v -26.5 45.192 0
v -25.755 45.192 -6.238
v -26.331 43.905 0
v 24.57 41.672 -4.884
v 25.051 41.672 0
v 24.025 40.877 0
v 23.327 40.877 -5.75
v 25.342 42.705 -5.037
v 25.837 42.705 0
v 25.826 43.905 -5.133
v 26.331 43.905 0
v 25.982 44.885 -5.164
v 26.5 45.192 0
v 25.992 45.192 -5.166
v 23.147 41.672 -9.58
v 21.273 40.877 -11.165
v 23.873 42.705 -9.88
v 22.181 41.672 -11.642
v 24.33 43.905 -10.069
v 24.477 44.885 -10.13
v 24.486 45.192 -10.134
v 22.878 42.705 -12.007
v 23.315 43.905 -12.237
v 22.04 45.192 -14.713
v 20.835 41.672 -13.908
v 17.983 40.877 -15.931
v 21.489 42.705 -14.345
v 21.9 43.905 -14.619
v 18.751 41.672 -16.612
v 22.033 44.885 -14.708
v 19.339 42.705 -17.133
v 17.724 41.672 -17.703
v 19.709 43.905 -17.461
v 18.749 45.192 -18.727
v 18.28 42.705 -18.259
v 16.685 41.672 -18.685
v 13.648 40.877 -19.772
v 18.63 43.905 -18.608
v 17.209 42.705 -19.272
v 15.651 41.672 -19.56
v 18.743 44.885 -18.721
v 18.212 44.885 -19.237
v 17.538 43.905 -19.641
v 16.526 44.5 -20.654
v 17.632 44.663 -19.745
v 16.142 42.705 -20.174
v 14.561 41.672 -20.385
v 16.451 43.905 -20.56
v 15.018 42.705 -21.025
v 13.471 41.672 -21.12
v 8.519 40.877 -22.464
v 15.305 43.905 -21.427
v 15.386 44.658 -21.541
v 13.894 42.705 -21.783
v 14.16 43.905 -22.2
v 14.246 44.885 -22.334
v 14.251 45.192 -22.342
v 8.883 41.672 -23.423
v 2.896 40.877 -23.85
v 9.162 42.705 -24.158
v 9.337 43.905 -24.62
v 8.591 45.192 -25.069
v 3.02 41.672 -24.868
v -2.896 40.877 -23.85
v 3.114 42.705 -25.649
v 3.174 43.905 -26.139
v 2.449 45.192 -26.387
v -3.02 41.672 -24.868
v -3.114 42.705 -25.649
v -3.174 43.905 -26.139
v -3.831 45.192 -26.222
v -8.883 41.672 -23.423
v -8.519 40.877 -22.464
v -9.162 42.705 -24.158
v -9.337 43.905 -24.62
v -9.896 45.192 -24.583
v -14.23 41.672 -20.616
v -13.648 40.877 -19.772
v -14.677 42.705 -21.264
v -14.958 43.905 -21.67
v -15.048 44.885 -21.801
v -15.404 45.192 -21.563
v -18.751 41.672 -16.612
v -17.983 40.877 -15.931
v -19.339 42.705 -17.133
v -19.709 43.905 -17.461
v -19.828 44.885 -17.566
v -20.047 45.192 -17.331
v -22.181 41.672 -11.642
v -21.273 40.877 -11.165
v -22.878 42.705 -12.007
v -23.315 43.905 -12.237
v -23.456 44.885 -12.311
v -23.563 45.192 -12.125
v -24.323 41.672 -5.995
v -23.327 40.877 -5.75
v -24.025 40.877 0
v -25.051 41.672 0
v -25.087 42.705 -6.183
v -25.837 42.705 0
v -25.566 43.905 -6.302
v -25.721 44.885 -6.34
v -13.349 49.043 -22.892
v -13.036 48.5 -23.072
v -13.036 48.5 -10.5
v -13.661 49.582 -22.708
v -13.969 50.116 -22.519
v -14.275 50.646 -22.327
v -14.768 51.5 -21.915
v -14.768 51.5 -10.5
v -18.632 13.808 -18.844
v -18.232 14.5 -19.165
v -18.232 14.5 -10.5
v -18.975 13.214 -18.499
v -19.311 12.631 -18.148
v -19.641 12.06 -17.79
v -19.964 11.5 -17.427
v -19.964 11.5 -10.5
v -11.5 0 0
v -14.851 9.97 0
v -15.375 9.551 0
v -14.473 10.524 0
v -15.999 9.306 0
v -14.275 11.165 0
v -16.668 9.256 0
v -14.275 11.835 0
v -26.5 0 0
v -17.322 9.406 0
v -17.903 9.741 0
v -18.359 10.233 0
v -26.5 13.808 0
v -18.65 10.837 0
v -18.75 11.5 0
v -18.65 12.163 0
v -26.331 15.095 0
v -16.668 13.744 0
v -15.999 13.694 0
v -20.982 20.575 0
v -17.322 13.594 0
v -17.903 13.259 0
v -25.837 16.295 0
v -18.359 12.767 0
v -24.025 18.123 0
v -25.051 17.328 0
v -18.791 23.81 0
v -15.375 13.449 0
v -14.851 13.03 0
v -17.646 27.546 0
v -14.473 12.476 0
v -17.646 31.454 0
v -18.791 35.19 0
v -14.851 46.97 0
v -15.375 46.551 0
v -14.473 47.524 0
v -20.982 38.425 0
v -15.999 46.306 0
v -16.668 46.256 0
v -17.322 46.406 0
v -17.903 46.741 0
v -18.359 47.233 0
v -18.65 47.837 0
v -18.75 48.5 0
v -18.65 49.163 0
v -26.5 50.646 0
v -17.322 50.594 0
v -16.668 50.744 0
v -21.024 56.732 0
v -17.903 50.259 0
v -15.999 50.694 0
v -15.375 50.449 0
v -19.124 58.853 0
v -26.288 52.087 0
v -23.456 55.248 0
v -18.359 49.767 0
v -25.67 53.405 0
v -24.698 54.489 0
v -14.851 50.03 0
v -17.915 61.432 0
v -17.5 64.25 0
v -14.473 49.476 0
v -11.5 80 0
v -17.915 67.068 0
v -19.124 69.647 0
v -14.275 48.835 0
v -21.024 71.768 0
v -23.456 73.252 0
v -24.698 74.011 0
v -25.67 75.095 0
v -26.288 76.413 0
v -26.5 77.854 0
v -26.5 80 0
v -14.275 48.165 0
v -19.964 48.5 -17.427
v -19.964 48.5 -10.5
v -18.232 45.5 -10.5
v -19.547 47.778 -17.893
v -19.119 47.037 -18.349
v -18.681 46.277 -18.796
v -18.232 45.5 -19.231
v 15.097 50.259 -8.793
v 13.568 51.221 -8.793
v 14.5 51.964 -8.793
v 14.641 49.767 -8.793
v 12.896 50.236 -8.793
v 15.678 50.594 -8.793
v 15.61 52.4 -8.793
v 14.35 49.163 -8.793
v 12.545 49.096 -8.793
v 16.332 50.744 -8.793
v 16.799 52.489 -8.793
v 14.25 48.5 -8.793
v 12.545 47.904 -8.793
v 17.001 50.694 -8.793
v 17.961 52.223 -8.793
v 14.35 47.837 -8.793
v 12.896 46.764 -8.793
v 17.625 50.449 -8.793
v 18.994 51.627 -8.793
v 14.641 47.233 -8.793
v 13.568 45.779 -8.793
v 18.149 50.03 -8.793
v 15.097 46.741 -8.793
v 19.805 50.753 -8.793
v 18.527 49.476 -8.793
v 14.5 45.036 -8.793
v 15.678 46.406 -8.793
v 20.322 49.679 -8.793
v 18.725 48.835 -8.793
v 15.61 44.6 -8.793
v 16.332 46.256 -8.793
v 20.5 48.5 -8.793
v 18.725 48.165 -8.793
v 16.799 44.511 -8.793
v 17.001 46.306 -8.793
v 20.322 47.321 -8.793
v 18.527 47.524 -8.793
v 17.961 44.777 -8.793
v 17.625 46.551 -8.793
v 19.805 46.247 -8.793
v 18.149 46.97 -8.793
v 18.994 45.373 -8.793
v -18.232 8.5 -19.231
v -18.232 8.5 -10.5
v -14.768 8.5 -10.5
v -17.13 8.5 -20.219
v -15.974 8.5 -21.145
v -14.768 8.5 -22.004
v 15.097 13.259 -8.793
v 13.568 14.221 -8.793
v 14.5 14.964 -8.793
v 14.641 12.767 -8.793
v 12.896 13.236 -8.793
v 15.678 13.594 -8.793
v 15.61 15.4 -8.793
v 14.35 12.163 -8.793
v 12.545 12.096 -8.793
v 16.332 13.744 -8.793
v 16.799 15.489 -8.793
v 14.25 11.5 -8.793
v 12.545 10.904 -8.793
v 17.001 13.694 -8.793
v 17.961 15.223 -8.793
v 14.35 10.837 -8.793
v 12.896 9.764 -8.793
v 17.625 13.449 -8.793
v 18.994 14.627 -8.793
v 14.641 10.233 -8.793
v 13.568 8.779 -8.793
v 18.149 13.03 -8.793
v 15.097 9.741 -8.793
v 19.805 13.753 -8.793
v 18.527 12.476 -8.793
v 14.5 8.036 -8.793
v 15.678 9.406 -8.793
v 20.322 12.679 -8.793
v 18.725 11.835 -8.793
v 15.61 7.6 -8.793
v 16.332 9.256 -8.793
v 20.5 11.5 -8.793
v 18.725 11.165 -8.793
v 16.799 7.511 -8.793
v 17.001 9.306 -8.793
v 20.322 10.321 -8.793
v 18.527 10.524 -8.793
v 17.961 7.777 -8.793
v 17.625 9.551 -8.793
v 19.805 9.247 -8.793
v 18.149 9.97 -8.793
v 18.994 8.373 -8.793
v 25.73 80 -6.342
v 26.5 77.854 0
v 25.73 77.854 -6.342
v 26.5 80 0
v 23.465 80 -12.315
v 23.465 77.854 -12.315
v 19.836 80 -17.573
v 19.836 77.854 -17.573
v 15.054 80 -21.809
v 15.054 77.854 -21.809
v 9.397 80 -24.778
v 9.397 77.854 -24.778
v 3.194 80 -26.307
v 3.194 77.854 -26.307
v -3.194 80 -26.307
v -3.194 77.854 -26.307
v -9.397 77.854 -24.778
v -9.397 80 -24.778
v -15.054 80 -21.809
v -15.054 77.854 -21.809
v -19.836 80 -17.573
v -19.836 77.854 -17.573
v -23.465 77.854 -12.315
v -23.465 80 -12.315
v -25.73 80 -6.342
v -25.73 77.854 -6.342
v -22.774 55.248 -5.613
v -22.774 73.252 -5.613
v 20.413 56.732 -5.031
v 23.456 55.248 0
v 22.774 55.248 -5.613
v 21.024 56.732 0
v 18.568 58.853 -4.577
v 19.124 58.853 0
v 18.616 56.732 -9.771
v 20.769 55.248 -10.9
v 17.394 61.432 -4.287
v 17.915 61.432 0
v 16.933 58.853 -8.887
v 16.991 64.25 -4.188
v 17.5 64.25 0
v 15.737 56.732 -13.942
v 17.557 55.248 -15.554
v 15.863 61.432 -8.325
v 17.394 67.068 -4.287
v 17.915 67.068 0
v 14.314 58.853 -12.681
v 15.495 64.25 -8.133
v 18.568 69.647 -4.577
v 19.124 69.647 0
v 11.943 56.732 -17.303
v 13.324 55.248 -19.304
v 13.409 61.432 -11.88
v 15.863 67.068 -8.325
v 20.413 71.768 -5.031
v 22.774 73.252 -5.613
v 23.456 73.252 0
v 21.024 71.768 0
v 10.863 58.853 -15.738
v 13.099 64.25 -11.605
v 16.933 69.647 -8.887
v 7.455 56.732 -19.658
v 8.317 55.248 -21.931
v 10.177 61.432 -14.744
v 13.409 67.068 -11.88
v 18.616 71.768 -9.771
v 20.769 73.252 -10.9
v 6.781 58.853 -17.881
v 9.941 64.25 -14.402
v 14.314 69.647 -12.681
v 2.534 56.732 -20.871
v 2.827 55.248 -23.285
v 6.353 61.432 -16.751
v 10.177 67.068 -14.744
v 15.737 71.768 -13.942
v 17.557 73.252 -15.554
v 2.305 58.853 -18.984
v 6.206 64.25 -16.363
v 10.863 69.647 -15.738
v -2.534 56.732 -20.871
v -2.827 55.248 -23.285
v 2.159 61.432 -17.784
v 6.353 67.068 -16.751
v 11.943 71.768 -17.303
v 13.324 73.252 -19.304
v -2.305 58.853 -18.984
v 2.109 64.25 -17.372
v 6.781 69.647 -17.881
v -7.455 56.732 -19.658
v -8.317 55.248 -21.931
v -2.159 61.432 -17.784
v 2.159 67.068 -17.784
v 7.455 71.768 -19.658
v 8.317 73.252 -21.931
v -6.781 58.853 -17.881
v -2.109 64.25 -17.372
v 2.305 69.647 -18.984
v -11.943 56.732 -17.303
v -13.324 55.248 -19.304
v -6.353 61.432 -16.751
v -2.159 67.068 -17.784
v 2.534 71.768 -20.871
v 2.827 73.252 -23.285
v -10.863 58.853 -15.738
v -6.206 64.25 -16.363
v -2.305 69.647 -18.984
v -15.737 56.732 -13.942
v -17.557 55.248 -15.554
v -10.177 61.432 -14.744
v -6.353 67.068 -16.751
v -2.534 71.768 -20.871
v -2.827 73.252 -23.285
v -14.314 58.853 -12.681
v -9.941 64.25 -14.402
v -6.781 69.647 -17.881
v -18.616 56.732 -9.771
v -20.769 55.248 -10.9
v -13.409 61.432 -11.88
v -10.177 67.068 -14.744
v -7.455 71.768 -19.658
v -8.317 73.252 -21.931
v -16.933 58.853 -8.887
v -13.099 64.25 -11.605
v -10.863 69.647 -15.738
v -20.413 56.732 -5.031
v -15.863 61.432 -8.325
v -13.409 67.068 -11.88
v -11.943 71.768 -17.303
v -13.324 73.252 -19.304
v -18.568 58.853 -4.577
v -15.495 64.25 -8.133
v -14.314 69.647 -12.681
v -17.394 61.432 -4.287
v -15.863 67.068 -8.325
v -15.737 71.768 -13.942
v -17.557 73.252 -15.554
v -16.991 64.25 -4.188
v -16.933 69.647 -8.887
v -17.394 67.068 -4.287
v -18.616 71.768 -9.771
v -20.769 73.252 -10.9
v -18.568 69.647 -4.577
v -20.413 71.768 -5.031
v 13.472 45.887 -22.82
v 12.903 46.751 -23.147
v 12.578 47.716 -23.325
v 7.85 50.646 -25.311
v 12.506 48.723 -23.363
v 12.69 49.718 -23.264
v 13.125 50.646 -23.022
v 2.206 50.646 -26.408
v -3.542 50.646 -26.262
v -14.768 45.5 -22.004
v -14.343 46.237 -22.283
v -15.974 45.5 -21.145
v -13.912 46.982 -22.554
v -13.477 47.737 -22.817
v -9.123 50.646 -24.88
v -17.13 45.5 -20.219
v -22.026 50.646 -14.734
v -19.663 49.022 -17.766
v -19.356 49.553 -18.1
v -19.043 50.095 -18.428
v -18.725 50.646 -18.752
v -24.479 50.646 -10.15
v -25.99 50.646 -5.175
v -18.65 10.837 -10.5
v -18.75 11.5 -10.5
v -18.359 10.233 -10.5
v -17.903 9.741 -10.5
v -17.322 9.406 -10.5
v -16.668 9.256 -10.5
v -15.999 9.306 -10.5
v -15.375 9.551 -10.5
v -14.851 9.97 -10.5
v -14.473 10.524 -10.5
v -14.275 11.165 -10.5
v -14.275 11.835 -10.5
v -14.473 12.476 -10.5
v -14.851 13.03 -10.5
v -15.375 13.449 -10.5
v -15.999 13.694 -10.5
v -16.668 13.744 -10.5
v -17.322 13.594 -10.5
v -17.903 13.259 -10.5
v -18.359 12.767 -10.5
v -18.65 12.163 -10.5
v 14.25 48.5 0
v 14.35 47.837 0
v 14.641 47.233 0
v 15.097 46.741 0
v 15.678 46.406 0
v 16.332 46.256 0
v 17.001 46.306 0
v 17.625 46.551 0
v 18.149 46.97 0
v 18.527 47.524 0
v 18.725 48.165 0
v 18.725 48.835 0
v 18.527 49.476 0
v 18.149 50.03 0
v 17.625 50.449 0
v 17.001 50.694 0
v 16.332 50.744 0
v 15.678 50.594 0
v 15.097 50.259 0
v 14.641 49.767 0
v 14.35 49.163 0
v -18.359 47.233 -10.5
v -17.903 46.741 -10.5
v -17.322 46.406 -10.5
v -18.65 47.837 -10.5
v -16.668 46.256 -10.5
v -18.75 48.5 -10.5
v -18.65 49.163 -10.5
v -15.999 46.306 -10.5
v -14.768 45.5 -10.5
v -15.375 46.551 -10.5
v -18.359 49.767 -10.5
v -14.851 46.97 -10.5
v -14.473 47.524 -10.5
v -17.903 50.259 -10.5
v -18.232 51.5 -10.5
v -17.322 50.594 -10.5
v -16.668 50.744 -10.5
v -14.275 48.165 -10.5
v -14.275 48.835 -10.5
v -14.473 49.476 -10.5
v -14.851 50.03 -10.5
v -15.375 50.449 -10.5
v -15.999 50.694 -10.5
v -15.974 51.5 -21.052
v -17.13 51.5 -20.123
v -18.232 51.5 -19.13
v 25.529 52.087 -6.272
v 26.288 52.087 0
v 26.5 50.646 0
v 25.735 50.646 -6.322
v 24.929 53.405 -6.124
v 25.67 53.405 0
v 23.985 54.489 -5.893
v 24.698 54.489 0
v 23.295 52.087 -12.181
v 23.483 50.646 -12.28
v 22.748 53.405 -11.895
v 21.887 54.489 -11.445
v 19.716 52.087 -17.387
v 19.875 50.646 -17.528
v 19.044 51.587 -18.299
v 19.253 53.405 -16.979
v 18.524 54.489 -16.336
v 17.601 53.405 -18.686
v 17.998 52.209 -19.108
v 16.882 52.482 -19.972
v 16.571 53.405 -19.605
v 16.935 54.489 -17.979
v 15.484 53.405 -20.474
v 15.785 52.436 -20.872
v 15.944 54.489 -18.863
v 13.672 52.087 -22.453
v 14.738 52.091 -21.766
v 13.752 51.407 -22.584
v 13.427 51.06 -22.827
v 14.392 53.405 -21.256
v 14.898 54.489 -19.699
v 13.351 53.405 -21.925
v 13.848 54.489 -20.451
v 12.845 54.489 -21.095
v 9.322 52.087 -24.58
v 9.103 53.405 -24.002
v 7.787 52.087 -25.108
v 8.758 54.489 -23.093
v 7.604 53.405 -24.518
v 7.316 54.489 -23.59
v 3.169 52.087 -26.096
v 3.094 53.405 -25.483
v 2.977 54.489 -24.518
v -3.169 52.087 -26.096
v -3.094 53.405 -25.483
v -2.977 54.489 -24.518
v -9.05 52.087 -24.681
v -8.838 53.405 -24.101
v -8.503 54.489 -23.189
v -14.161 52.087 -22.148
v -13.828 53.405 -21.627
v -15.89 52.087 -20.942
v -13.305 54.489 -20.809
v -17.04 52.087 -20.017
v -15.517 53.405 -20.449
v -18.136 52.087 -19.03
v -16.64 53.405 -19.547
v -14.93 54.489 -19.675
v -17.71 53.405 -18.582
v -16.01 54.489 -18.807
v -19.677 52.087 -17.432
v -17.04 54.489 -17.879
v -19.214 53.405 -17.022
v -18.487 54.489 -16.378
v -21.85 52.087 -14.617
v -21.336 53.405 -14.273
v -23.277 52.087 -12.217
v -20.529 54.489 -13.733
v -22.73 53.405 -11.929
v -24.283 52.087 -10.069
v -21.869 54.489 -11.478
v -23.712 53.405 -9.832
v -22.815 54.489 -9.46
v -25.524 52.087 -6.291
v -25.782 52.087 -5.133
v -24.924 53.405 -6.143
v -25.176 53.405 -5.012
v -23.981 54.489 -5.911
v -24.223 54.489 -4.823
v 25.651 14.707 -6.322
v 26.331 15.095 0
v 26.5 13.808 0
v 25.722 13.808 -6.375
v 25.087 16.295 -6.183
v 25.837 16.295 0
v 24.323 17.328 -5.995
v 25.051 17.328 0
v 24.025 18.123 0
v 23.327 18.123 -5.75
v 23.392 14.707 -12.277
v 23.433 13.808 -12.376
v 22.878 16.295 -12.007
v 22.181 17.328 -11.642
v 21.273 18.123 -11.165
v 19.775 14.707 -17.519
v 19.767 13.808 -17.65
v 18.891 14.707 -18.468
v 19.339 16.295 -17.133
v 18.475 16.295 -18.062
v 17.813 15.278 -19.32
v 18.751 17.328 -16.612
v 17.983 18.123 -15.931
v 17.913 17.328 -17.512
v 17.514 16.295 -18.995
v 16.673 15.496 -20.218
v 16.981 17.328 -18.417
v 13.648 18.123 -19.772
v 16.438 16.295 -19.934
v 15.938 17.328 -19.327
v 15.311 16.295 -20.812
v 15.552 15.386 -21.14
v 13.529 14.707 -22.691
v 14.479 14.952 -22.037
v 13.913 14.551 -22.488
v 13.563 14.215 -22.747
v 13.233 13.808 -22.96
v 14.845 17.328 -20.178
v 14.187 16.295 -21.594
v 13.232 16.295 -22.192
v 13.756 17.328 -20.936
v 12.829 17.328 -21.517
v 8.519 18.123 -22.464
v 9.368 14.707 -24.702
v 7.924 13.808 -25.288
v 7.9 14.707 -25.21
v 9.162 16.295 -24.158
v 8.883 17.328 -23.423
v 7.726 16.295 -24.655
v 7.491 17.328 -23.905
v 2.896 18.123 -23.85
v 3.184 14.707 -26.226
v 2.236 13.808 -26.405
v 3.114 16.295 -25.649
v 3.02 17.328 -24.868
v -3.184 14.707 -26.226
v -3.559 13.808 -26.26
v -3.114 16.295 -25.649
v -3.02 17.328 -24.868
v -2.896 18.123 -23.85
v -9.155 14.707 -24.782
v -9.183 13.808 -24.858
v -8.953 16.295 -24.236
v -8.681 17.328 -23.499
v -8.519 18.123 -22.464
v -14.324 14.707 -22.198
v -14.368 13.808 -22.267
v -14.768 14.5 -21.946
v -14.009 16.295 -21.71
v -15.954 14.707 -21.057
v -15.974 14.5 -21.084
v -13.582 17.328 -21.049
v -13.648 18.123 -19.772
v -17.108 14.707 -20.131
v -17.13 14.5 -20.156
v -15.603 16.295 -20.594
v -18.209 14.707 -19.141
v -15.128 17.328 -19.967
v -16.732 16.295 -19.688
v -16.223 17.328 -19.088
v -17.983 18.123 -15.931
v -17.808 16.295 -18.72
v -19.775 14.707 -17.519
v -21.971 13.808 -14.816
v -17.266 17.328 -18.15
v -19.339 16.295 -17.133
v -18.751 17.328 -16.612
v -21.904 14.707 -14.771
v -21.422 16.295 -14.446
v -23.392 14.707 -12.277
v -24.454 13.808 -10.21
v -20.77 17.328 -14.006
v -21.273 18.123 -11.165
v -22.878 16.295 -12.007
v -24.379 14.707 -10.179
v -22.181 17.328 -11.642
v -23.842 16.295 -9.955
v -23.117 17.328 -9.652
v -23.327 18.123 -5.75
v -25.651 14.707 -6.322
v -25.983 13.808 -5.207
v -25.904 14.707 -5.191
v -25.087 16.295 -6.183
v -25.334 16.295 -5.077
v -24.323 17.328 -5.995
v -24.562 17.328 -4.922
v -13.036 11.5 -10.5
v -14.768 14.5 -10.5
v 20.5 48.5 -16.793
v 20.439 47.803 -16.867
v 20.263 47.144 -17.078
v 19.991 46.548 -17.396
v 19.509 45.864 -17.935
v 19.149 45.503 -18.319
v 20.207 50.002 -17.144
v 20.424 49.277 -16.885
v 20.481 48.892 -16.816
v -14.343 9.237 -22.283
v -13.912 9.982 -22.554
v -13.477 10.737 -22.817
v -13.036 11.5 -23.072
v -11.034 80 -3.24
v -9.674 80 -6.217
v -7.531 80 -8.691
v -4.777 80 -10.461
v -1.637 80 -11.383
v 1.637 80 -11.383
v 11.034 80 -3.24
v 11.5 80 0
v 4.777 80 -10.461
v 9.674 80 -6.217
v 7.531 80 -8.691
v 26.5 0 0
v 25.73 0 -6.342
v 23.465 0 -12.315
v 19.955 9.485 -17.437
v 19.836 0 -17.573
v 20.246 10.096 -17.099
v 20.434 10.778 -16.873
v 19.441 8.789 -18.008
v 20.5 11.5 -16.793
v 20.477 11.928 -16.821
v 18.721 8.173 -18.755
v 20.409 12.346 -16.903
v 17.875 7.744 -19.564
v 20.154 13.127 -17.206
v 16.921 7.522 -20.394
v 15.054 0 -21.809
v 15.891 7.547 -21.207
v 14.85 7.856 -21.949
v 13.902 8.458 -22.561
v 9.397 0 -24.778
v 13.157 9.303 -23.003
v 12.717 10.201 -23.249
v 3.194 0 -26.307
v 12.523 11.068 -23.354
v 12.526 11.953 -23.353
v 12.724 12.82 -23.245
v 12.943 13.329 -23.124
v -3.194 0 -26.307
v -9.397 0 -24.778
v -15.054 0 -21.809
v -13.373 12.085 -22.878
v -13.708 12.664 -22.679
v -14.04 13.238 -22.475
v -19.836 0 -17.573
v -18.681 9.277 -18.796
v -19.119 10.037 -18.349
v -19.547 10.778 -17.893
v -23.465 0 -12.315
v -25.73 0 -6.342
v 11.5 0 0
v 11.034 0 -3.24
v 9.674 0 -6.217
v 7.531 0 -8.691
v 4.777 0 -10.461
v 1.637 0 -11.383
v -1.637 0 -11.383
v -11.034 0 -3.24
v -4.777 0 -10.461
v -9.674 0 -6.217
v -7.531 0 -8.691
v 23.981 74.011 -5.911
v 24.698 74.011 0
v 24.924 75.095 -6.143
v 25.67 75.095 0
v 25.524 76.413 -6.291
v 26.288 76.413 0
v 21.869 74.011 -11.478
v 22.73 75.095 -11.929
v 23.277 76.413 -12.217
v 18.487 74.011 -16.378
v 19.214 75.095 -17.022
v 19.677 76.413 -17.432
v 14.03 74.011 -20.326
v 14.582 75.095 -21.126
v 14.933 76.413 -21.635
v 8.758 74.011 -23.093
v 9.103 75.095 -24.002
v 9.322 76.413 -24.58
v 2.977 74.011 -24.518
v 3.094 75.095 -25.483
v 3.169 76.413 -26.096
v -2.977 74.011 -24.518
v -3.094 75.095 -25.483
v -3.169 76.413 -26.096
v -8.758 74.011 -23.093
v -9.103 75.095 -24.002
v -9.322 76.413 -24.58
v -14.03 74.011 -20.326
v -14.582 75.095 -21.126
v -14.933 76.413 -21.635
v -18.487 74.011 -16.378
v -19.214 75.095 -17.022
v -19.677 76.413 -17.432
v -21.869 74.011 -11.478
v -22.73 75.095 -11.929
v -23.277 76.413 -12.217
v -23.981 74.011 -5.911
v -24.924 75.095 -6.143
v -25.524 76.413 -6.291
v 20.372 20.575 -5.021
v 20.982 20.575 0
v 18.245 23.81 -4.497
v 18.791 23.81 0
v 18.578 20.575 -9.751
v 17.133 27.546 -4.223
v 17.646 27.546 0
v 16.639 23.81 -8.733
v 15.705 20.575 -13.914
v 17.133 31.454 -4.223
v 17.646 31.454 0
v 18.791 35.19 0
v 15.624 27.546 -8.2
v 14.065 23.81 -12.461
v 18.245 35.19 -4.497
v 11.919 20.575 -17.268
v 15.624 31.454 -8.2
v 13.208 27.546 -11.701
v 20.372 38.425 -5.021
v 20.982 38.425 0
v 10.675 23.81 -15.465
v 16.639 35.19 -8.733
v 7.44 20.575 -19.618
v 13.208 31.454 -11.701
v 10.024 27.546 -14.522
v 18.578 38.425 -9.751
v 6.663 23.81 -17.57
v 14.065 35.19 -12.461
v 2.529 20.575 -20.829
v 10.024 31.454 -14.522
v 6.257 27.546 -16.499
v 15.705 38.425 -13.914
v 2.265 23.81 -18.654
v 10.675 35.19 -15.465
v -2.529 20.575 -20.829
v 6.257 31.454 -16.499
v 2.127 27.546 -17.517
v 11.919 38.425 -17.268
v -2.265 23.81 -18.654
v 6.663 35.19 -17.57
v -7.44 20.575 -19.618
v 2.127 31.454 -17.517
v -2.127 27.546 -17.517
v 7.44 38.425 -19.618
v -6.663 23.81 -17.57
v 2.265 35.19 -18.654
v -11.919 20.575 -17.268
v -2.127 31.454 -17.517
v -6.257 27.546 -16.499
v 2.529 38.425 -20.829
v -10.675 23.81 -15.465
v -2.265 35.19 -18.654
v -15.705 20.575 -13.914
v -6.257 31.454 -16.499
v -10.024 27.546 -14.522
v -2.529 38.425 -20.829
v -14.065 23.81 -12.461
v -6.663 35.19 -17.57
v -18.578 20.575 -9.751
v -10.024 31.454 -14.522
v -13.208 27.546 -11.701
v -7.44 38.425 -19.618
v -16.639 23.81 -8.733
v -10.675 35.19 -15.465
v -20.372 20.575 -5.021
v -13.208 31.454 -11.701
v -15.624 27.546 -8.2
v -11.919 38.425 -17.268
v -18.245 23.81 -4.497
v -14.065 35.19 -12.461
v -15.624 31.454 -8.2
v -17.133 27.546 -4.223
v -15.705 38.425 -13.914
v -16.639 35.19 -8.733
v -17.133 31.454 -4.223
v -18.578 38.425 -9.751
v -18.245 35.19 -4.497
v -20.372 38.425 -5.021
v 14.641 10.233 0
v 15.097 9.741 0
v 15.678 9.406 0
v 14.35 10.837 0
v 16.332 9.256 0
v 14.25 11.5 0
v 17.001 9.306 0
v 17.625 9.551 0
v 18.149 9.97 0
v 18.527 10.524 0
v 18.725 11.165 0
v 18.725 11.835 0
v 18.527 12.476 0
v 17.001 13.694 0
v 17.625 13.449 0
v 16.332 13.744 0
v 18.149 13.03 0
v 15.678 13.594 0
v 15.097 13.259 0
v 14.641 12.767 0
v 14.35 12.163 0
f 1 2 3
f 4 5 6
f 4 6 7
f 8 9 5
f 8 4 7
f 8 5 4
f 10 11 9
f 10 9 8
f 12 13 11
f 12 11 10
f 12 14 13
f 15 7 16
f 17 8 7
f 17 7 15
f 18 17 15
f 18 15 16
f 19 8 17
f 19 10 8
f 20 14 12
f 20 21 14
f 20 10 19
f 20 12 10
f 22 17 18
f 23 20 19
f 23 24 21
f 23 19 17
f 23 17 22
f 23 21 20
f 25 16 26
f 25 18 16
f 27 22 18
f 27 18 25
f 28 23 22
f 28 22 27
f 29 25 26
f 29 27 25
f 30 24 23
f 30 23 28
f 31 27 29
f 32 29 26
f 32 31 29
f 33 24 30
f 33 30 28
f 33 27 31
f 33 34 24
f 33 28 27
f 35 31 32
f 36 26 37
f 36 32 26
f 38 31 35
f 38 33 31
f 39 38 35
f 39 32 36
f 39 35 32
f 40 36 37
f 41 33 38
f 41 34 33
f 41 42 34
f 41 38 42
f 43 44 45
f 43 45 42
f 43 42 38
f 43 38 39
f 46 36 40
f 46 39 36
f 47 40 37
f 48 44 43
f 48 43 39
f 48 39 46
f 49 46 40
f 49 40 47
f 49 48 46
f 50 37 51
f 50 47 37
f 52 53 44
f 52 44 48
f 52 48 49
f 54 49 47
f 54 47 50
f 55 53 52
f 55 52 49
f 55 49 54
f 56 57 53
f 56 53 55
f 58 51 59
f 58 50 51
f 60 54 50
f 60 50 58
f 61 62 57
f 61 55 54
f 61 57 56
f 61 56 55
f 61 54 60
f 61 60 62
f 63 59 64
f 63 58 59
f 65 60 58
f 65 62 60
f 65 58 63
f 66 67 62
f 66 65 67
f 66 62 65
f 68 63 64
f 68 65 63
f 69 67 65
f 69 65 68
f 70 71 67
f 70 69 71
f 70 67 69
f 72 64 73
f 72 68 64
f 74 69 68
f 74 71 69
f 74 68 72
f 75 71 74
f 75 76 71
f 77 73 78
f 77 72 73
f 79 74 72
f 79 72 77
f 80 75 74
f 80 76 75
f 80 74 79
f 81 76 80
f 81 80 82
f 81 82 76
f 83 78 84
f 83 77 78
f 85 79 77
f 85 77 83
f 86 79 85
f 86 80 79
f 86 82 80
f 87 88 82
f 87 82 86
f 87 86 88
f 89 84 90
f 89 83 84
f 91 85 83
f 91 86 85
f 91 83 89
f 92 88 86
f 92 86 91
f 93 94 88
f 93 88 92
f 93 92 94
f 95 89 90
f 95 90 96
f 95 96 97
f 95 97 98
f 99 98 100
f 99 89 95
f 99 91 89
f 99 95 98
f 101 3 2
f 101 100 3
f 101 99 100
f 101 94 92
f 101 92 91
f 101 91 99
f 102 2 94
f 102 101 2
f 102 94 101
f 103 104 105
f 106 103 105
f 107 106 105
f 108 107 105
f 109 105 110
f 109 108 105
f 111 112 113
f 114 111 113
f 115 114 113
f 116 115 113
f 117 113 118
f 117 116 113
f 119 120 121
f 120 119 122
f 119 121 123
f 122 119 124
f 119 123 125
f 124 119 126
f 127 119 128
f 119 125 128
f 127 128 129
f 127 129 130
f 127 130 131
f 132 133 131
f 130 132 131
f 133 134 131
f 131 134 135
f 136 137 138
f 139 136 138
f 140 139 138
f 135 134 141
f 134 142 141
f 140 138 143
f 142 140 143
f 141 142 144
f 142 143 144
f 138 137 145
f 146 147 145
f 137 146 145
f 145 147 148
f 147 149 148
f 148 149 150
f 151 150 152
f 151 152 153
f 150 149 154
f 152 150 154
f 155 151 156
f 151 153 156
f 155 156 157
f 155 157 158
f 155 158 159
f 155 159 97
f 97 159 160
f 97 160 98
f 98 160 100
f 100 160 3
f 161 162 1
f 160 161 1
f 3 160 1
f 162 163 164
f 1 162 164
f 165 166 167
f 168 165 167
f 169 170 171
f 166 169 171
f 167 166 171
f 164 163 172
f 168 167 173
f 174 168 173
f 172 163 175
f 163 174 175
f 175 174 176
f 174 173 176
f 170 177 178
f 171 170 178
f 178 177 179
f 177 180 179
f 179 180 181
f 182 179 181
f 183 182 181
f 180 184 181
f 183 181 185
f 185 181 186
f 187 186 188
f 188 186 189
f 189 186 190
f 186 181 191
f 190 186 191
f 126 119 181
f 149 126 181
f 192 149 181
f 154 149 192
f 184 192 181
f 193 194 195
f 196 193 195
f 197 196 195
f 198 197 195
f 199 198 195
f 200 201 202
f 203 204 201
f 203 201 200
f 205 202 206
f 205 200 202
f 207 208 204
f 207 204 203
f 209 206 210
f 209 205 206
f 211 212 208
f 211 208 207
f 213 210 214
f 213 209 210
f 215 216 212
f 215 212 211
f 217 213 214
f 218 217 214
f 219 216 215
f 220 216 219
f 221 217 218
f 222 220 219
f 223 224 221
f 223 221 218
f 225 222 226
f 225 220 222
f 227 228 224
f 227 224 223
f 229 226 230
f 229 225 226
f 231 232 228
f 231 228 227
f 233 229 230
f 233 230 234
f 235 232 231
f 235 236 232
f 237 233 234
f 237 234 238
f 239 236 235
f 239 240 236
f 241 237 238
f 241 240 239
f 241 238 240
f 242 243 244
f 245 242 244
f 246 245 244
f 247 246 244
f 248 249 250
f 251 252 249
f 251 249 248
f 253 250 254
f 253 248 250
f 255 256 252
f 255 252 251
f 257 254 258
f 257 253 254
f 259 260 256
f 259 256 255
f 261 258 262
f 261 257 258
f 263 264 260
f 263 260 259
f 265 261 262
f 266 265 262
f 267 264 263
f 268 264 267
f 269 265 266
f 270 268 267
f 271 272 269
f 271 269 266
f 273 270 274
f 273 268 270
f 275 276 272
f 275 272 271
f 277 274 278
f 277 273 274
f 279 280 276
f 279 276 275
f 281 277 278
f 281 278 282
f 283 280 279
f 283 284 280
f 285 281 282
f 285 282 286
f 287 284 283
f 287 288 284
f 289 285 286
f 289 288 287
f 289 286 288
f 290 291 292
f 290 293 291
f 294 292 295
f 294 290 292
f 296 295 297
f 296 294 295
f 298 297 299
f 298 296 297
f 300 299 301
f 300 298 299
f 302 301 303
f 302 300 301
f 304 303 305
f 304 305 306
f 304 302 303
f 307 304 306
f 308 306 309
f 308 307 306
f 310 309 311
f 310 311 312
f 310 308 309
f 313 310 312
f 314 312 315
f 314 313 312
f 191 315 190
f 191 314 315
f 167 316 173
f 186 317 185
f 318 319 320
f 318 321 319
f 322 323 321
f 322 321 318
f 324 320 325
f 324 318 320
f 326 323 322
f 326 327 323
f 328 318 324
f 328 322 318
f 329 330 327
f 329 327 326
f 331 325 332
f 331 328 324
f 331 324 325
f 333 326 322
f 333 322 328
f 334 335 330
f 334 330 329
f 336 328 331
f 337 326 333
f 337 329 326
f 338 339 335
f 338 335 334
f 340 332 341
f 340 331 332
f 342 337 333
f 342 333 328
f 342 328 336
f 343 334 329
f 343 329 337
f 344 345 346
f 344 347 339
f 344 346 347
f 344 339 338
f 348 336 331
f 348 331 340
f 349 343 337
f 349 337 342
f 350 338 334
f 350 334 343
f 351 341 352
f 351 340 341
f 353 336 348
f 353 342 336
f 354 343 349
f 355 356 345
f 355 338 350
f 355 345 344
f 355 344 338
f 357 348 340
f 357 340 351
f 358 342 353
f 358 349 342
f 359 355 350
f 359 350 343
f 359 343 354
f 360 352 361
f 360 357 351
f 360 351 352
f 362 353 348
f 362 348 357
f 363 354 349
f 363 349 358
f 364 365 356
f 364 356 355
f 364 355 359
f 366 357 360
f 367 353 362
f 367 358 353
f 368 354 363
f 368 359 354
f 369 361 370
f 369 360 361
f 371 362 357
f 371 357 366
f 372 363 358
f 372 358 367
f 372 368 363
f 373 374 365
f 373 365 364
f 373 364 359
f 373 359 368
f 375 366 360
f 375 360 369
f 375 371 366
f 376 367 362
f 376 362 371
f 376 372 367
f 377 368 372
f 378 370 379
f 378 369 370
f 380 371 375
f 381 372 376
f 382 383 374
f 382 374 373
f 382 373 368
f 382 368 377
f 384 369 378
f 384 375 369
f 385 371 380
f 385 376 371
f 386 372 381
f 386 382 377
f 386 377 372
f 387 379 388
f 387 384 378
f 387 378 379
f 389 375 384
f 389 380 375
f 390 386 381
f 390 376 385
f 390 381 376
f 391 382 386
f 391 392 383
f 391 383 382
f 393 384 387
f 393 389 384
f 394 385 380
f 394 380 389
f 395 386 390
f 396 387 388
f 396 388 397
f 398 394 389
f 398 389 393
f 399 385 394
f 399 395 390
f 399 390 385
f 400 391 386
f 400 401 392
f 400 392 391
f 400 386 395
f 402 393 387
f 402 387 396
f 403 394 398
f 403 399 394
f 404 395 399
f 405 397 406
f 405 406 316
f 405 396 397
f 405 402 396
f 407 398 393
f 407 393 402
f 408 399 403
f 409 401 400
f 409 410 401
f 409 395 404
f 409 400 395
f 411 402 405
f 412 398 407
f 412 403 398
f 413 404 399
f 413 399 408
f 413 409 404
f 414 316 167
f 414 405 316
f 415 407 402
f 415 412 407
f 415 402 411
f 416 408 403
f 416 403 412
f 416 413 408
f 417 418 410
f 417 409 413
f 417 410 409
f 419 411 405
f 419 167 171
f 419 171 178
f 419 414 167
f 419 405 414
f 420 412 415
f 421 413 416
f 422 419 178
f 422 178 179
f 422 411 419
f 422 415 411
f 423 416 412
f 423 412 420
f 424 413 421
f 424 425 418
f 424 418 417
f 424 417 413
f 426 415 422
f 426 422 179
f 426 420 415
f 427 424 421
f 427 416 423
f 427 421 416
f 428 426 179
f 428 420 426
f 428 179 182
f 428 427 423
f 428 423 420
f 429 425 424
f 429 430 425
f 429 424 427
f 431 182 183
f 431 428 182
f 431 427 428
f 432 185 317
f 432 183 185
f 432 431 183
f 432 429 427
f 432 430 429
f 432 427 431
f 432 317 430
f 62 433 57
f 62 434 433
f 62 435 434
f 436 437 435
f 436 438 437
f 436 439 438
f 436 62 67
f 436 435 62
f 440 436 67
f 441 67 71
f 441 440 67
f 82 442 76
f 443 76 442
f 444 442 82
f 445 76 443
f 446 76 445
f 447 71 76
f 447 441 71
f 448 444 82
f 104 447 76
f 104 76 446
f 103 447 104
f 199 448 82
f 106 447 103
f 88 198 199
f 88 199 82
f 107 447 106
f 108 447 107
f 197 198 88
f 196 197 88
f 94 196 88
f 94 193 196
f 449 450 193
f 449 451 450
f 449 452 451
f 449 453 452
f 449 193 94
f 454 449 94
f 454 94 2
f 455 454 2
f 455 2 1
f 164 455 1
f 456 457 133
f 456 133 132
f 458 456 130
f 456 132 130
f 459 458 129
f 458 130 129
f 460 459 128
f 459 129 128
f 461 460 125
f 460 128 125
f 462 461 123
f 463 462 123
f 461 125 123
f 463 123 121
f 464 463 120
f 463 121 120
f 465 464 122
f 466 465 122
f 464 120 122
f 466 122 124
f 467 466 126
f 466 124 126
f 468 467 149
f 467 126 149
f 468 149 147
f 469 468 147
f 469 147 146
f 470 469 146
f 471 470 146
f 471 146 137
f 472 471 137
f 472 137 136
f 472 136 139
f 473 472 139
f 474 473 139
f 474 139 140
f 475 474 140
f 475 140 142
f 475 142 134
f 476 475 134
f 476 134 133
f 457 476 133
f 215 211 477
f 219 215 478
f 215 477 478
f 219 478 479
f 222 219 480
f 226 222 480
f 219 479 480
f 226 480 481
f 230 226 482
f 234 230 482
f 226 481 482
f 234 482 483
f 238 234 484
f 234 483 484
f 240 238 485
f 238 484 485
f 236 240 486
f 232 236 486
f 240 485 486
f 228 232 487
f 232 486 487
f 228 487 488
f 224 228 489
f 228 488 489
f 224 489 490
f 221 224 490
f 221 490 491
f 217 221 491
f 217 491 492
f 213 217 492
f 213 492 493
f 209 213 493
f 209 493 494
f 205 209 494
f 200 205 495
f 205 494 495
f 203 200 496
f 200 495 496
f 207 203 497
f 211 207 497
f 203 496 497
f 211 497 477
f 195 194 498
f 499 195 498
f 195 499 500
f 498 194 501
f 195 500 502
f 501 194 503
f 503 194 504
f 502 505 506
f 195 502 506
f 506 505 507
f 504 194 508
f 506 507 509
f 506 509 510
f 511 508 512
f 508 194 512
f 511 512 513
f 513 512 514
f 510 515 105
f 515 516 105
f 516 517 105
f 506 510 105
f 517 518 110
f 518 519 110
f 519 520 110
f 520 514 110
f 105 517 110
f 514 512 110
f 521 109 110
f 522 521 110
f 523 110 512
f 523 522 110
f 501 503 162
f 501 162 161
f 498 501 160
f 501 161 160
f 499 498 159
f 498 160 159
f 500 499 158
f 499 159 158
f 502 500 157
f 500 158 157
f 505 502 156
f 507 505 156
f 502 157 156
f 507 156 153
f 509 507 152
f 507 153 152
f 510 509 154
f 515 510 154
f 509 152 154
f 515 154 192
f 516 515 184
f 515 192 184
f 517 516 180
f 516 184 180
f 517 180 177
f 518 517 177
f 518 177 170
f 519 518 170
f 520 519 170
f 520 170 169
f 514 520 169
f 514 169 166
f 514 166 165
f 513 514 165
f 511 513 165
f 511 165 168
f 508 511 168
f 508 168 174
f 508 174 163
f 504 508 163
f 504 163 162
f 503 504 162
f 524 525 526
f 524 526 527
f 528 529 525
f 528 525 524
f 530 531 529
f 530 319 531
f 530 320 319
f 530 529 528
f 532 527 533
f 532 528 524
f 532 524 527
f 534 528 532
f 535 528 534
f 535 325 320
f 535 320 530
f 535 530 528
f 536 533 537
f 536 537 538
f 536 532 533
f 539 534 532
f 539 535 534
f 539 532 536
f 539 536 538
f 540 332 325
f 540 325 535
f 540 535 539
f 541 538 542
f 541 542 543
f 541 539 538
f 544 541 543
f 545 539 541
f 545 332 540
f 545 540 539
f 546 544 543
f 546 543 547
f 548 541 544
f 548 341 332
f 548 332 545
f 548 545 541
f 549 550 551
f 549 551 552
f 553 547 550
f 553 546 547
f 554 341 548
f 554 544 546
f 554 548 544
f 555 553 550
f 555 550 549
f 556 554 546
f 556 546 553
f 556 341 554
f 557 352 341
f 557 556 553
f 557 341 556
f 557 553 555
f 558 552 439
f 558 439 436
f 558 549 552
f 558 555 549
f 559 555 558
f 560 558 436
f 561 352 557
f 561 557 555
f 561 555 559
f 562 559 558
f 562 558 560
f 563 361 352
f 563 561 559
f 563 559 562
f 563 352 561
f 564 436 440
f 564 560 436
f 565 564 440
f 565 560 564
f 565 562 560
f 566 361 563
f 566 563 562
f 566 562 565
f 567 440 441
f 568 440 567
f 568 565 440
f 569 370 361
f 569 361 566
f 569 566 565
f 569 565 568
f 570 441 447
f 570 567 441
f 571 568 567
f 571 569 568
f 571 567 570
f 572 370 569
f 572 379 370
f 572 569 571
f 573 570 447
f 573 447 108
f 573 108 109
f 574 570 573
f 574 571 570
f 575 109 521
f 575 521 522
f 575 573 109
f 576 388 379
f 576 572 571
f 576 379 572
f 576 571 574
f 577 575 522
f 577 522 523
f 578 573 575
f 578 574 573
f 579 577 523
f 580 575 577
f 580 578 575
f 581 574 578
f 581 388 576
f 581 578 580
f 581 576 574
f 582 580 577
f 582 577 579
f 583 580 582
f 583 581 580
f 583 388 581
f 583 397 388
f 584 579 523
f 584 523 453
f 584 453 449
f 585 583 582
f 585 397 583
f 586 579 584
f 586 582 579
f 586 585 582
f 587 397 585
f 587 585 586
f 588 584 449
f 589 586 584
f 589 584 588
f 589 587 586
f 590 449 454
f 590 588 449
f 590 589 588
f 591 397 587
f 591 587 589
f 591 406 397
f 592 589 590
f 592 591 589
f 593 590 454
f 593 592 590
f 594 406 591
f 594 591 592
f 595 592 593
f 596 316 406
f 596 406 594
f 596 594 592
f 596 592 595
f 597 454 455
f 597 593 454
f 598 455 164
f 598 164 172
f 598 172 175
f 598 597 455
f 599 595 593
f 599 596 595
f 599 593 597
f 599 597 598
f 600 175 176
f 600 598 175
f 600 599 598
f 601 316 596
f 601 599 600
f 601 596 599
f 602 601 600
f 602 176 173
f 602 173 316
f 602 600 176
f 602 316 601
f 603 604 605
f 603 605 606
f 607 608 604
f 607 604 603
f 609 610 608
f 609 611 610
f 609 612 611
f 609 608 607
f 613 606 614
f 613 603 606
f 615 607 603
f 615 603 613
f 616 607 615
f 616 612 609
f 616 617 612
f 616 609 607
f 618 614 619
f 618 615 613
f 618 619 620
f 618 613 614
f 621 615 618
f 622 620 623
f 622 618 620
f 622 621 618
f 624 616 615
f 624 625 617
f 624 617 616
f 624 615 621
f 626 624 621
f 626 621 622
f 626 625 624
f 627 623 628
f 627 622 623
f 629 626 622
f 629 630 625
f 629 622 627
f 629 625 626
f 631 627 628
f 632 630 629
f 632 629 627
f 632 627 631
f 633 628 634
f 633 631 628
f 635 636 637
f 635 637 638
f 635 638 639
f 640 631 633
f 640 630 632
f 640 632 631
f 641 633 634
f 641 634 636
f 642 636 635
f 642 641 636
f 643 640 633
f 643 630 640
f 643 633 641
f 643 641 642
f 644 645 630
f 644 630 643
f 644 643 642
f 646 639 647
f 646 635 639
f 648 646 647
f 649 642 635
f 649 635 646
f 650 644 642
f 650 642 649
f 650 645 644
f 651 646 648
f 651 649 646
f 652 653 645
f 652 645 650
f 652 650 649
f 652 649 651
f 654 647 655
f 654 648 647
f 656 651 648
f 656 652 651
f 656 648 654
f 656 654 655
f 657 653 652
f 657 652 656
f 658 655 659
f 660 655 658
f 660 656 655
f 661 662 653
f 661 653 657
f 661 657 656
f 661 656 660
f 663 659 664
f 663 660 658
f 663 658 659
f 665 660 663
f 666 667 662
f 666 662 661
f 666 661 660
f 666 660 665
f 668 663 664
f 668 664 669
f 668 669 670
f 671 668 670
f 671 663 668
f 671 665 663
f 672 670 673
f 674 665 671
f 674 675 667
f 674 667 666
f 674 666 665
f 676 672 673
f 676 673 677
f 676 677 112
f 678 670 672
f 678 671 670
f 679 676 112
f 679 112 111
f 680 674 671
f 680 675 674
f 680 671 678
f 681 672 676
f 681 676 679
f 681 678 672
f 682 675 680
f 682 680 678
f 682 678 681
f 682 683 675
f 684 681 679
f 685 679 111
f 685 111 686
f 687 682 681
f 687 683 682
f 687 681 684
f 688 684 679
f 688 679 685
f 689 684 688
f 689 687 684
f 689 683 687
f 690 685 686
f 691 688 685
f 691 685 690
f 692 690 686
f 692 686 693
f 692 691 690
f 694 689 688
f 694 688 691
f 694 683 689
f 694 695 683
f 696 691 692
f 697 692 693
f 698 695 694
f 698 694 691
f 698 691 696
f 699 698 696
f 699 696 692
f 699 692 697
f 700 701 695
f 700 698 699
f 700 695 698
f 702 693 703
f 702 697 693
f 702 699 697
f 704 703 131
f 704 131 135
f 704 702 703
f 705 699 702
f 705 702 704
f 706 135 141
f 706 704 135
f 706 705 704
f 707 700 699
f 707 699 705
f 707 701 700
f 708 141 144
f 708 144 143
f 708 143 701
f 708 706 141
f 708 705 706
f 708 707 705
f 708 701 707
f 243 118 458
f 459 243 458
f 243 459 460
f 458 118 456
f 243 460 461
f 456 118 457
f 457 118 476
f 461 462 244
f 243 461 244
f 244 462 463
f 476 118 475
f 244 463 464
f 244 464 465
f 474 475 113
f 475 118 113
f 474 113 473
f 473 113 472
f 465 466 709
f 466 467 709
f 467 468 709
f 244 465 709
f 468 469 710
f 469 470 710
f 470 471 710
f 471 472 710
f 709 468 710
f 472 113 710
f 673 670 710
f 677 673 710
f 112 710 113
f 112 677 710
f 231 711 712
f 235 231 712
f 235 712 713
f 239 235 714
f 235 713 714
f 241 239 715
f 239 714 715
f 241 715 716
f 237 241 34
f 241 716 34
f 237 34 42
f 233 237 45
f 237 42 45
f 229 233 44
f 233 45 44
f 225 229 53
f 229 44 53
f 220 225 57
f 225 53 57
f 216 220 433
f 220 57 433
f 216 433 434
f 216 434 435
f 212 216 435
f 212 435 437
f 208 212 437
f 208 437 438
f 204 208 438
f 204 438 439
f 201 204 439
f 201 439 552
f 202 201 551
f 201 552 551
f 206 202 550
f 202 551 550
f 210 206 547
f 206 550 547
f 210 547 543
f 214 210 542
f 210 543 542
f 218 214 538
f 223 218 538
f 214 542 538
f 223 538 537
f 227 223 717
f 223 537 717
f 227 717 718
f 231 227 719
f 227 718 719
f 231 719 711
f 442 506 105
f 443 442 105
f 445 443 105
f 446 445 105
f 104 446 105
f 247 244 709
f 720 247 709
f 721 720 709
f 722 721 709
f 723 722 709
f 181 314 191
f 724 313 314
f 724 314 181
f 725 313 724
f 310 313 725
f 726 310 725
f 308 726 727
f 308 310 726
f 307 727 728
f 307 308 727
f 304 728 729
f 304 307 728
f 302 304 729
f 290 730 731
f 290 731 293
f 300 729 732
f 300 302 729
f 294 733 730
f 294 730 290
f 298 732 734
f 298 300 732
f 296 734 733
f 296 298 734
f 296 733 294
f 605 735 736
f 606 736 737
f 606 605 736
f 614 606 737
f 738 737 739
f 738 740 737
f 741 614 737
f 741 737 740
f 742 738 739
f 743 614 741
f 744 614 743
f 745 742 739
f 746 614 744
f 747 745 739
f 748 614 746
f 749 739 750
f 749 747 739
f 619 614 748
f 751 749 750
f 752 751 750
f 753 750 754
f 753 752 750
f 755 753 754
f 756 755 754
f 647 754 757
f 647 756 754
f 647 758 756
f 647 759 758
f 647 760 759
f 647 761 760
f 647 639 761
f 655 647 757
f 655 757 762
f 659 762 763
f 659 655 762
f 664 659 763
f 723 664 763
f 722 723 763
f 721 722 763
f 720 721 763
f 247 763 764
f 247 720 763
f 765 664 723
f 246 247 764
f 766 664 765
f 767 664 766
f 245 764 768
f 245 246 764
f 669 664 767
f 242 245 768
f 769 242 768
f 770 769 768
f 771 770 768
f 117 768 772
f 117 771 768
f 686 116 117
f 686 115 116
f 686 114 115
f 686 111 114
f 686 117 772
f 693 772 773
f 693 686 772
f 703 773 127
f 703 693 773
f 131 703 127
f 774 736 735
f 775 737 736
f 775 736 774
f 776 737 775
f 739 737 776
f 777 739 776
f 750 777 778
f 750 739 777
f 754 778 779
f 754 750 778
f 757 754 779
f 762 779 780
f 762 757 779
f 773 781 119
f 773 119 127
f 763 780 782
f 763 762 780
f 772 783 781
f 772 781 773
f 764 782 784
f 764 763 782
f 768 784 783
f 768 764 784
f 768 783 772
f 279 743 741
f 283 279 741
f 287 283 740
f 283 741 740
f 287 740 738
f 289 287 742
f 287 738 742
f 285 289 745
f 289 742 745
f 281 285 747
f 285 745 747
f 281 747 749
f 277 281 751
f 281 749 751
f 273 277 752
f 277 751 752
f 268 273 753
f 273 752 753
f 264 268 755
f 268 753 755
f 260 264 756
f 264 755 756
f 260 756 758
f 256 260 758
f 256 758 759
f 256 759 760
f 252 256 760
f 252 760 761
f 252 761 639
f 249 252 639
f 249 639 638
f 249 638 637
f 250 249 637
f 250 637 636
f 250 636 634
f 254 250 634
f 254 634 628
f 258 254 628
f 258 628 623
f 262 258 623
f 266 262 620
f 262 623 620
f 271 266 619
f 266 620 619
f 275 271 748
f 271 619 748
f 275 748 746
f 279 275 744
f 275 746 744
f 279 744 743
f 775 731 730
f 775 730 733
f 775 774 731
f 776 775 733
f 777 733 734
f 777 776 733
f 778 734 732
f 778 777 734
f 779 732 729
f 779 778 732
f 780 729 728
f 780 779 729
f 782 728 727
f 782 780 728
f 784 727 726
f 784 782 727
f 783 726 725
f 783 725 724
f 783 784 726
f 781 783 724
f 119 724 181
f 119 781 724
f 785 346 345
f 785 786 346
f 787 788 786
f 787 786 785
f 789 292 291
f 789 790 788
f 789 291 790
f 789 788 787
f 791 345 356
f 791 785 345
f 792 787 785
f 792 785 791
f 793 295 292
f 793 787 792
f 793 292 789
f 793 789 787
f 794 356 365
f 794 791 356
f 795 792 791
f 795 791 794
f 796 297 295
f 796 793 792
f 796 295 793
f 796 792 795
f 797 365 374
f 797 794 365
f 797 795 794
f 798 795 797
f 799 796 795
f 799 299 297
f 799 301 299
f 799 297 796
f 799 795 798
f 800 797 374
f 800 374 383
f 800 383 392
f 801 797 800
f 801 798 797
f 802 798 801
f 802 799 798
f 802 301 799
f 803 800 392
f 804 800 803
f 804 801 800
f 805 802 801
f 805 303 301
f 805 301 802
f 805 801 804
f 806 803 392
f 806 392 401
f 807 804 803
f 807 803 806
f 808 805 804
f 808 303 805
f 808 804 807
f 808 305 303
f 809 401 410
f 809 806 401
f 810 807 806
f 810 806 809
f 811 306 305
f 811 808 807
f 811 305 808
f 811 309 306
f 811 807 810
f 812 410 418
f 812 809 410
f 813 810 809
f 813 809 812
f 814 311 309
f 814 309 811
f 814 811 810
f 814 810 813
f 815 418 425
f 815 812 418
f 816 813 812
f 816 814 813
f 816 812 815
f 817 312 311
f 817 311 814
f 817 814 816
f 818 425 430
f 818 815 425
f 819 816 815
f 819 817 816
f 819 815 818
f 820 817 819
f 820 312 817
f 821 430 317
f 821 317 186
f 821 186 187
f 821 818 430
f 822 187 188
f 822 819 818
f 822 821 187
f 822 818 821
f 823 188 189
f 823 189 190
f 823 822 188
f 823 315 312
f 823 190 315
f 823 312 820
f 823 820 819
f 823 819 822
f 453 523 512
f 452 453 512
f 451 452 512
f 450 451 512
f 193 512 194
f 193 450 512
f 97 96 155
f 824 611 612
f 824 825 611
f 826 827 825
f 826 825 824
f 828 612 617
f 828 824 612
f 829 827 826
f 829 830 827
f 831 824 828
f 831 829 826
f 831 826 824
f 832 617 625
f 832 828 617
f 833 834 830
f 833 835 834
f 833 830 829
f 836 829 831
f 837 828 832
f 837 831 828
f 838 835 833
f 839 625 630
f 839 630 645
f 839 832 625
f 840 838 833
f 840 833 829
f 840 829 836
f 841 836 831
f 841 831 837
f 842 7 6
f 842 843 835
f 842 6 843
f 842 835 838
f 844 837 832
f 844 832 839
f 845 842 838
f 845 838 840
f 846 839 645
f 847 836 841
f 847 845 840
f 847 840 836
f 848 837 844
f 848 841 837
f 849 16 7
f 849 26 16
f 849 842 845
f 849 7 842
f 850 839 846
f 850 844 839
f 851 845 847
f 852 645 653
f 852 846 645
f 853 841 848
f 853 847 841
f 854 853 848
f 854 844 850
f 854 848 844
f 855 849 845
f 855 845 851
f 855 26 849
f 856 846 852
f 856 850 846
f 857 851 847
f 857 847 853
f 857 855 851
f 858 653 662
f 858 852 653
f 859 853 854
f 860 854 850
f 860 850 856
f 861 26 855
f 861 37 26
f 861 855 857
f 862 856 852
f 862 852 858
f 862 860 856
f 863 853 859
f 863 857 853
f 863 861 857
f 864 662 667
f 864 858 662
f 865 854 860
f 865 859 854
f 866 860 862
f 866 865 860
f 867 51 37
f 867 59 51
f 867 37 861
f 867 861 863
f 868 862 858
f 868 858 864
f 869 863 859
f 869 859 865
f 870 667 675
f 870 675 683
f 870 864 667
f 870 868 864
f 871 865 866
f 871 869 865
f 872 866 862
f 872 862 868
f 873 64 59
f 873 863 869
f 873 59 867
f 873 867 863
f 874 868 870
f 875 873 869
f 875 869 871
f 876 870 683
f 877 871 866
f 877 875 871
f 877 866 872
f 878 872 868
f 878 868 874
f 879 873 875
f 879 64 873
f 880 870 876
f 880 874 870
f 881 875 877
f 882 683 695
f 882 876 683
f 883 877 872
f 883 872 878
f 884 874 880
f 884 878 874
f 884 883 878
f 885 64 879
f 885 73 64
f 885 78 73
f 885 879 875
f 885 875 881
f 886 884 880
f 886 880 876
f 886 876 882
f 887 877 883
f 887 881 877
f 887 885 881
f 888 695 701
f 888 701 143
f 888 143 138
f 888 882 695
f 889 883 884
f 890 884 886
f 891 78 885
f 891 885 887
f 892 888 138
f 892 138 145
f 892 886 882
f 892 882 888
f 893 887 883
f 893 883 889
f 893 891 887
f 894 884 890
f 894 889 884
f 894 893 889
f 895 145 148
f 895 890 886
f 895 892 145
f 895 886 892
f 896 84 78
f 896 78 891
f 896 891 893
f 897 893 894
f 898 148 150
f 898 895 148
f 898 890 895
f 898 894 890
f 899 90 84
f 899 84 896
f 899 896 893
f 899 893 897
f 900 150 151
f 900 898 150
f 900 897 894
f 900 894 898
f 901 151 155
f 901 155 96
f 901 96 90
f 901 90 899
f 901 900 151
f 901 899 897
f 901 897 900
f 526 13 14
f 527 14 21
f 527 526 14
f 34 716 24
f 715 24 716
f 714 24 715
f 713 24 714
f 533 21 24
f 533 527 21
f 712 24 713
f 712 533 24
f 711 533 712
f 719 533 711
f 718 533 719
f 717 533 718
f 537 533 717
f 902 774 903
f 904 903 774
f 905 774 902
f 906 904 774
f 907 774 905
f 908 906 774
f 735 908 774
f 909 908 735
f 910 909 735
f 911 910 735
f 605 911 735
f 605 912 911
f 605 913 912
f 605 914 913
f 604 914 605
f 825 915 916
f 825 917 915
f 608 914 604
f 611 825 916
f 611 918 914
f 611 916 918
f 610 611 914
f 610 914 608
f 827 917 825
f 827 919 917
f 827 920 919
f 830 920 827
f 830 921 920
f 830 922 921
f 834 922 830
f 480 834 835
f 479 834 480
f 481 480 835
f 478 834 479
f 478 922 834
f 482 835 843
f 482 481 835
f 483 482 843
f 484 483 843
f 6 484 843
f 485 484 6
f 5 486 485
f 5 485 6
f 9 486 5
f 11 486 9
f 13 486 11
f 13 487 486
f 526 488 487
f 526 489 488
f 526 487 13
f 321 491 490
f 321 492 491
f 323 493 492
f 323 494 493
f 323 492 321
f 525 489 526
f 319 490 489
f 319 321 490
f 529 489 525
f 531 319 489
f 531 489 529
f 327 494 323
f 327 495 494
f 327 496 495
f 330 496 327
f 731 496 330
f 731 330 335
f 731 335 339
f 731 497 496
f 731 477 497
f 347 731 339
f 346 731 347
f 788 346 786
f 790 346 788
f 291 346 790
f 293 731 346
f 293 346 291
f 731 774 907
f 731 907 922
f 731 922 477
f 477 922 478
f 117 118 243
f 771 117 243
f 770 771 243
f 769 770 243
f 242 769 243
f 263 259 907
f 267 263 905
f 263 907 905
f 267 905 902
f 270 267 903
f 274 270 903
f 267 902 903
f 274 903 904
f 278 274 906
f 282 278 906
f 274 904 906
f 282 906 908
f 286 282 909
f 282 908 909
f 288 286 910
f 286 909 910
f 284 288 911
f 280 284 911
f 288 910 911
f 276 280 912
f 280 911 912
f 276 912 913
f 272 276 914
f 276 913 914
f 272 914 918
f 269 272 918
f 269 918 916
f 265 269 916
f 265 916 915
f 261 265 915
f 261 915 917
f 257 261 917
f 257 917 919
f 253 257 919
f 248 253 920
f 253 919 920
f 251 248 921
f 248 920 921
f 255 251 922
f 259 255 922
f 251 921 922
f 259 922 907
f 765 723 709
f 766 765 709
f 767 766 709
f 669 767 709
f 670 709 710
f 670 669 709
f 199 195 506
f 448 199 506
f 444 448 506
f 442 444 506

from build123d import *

# Parameters (mm, degrees)
F1_ANGLE       = 180
F4_D           = 4.5
F4_START       = 9.7071445
F4_CBORE_D     = 8
F4_CBORE_DEPTH = 8
F5_D           = 4.5
F6_DEPTH       = 16
F7_DEPTH       = 16


with BuildPart() as f1:
    # F0 (on Top) → F1 (revolve)
    with BuildSketch(Plane.XY):
        with BuildLine():
            Line((11.5, 80), (11.5, 0))
            Line((11.5, 0), (26.5, 0))
            Line((26.5, 0), (26.5, 13.8076451735))
            ThreePointArc((26.5, 13.8076451735), (25.8372883559, 16.2952001412), (24.0248281131, 18.123342452))
            ThreePointArc((24.0248281131, 18.123342452), (17.5, 29.5), (24.0248281131, 40.876657548))
            ThreePointArc((24.0248281131, 40.876657548), (25.8372883559, 42.7047998588), (26.5, 45.1923548265))
            Line((26.5, 45.1923548265), (26.5, 50.6462321396))
            ThreePointArc((26.5, 50.6462321396), (25.6700127509, 53.4050350788), (23.455602537, 55.2479295131))
            ThreePointArc((23.455602537, 55.2479295131), (17.5, 64.25), (23.455602537, 73.2520704869))
            ThreePointArc((23.455602537, 73.2520704869), (25.6700127509, 75.0949649212), (26.5, 77.8537678604))
            Line((26.5, 77.8537678604), (26.5, 80))
            Line((26.5, 80), (11.5, 80))
        make_face()
    revolve(axis=Axis((0, 49.9980136495, 0), (0, 1, 0)), revolution_arc=F1_ANGLE)

    # F4 (through all)
    # its depths count from where the whole tool has entered the part; down to there all is cleared
    with Locations(Plane(origin=(0, 0, -26.5), x_dir=(1, 0, 0), z_dir=(0, 0, -1)).offset(-F4_START)):
        with Locations((16.5, -11.5), (16.5, -48.5)):
            CounterBoreHole(F4_D / 2, F4_CBORE_D / 2, F4_CBORE_DEPTH)

    # F5 (through all)
    with Locations(Plane(origin=(0, 0, -26.5), x_dir=(1, 0, 0), z_dir=(0, 0, -1))):
        with Locations((-16.5, -48.5), (-16.5, -11.5)):
            Hole(F5_D / 2)

    # F3 (on offset) → F6 (cut)
    with BuildSketch(Plane.XY.offset(-26.5)):
        Polygon((-14.7679491924, 14.5), (-18.2320508076, 14.5), (-19.9641016151, 11.5), (-18.2320508076, 8.5), (-14.7679491924, 8.5), (-13.0358983849, 11.5), align=None)
    extrude(amount=F6_DEPTH, mode=Mode.SUBTRACT)

    # F3 (on offset) → F7 (cut)
    with BuildSketch(Plane.XY.offset(-26.5)):
        Polygon((-19.9641016151, 48.5), (-18.2320508076, 45.5), (-14.7679491924, 45.5), (-13.0358983849, 48.5), (-14.7679491924, 51.5), (-18.2320508076, 51.5), align=None)
    extrude(amount=F7_DEPTH, mode=Mode.SUBTRACT)


solid = f1.part
